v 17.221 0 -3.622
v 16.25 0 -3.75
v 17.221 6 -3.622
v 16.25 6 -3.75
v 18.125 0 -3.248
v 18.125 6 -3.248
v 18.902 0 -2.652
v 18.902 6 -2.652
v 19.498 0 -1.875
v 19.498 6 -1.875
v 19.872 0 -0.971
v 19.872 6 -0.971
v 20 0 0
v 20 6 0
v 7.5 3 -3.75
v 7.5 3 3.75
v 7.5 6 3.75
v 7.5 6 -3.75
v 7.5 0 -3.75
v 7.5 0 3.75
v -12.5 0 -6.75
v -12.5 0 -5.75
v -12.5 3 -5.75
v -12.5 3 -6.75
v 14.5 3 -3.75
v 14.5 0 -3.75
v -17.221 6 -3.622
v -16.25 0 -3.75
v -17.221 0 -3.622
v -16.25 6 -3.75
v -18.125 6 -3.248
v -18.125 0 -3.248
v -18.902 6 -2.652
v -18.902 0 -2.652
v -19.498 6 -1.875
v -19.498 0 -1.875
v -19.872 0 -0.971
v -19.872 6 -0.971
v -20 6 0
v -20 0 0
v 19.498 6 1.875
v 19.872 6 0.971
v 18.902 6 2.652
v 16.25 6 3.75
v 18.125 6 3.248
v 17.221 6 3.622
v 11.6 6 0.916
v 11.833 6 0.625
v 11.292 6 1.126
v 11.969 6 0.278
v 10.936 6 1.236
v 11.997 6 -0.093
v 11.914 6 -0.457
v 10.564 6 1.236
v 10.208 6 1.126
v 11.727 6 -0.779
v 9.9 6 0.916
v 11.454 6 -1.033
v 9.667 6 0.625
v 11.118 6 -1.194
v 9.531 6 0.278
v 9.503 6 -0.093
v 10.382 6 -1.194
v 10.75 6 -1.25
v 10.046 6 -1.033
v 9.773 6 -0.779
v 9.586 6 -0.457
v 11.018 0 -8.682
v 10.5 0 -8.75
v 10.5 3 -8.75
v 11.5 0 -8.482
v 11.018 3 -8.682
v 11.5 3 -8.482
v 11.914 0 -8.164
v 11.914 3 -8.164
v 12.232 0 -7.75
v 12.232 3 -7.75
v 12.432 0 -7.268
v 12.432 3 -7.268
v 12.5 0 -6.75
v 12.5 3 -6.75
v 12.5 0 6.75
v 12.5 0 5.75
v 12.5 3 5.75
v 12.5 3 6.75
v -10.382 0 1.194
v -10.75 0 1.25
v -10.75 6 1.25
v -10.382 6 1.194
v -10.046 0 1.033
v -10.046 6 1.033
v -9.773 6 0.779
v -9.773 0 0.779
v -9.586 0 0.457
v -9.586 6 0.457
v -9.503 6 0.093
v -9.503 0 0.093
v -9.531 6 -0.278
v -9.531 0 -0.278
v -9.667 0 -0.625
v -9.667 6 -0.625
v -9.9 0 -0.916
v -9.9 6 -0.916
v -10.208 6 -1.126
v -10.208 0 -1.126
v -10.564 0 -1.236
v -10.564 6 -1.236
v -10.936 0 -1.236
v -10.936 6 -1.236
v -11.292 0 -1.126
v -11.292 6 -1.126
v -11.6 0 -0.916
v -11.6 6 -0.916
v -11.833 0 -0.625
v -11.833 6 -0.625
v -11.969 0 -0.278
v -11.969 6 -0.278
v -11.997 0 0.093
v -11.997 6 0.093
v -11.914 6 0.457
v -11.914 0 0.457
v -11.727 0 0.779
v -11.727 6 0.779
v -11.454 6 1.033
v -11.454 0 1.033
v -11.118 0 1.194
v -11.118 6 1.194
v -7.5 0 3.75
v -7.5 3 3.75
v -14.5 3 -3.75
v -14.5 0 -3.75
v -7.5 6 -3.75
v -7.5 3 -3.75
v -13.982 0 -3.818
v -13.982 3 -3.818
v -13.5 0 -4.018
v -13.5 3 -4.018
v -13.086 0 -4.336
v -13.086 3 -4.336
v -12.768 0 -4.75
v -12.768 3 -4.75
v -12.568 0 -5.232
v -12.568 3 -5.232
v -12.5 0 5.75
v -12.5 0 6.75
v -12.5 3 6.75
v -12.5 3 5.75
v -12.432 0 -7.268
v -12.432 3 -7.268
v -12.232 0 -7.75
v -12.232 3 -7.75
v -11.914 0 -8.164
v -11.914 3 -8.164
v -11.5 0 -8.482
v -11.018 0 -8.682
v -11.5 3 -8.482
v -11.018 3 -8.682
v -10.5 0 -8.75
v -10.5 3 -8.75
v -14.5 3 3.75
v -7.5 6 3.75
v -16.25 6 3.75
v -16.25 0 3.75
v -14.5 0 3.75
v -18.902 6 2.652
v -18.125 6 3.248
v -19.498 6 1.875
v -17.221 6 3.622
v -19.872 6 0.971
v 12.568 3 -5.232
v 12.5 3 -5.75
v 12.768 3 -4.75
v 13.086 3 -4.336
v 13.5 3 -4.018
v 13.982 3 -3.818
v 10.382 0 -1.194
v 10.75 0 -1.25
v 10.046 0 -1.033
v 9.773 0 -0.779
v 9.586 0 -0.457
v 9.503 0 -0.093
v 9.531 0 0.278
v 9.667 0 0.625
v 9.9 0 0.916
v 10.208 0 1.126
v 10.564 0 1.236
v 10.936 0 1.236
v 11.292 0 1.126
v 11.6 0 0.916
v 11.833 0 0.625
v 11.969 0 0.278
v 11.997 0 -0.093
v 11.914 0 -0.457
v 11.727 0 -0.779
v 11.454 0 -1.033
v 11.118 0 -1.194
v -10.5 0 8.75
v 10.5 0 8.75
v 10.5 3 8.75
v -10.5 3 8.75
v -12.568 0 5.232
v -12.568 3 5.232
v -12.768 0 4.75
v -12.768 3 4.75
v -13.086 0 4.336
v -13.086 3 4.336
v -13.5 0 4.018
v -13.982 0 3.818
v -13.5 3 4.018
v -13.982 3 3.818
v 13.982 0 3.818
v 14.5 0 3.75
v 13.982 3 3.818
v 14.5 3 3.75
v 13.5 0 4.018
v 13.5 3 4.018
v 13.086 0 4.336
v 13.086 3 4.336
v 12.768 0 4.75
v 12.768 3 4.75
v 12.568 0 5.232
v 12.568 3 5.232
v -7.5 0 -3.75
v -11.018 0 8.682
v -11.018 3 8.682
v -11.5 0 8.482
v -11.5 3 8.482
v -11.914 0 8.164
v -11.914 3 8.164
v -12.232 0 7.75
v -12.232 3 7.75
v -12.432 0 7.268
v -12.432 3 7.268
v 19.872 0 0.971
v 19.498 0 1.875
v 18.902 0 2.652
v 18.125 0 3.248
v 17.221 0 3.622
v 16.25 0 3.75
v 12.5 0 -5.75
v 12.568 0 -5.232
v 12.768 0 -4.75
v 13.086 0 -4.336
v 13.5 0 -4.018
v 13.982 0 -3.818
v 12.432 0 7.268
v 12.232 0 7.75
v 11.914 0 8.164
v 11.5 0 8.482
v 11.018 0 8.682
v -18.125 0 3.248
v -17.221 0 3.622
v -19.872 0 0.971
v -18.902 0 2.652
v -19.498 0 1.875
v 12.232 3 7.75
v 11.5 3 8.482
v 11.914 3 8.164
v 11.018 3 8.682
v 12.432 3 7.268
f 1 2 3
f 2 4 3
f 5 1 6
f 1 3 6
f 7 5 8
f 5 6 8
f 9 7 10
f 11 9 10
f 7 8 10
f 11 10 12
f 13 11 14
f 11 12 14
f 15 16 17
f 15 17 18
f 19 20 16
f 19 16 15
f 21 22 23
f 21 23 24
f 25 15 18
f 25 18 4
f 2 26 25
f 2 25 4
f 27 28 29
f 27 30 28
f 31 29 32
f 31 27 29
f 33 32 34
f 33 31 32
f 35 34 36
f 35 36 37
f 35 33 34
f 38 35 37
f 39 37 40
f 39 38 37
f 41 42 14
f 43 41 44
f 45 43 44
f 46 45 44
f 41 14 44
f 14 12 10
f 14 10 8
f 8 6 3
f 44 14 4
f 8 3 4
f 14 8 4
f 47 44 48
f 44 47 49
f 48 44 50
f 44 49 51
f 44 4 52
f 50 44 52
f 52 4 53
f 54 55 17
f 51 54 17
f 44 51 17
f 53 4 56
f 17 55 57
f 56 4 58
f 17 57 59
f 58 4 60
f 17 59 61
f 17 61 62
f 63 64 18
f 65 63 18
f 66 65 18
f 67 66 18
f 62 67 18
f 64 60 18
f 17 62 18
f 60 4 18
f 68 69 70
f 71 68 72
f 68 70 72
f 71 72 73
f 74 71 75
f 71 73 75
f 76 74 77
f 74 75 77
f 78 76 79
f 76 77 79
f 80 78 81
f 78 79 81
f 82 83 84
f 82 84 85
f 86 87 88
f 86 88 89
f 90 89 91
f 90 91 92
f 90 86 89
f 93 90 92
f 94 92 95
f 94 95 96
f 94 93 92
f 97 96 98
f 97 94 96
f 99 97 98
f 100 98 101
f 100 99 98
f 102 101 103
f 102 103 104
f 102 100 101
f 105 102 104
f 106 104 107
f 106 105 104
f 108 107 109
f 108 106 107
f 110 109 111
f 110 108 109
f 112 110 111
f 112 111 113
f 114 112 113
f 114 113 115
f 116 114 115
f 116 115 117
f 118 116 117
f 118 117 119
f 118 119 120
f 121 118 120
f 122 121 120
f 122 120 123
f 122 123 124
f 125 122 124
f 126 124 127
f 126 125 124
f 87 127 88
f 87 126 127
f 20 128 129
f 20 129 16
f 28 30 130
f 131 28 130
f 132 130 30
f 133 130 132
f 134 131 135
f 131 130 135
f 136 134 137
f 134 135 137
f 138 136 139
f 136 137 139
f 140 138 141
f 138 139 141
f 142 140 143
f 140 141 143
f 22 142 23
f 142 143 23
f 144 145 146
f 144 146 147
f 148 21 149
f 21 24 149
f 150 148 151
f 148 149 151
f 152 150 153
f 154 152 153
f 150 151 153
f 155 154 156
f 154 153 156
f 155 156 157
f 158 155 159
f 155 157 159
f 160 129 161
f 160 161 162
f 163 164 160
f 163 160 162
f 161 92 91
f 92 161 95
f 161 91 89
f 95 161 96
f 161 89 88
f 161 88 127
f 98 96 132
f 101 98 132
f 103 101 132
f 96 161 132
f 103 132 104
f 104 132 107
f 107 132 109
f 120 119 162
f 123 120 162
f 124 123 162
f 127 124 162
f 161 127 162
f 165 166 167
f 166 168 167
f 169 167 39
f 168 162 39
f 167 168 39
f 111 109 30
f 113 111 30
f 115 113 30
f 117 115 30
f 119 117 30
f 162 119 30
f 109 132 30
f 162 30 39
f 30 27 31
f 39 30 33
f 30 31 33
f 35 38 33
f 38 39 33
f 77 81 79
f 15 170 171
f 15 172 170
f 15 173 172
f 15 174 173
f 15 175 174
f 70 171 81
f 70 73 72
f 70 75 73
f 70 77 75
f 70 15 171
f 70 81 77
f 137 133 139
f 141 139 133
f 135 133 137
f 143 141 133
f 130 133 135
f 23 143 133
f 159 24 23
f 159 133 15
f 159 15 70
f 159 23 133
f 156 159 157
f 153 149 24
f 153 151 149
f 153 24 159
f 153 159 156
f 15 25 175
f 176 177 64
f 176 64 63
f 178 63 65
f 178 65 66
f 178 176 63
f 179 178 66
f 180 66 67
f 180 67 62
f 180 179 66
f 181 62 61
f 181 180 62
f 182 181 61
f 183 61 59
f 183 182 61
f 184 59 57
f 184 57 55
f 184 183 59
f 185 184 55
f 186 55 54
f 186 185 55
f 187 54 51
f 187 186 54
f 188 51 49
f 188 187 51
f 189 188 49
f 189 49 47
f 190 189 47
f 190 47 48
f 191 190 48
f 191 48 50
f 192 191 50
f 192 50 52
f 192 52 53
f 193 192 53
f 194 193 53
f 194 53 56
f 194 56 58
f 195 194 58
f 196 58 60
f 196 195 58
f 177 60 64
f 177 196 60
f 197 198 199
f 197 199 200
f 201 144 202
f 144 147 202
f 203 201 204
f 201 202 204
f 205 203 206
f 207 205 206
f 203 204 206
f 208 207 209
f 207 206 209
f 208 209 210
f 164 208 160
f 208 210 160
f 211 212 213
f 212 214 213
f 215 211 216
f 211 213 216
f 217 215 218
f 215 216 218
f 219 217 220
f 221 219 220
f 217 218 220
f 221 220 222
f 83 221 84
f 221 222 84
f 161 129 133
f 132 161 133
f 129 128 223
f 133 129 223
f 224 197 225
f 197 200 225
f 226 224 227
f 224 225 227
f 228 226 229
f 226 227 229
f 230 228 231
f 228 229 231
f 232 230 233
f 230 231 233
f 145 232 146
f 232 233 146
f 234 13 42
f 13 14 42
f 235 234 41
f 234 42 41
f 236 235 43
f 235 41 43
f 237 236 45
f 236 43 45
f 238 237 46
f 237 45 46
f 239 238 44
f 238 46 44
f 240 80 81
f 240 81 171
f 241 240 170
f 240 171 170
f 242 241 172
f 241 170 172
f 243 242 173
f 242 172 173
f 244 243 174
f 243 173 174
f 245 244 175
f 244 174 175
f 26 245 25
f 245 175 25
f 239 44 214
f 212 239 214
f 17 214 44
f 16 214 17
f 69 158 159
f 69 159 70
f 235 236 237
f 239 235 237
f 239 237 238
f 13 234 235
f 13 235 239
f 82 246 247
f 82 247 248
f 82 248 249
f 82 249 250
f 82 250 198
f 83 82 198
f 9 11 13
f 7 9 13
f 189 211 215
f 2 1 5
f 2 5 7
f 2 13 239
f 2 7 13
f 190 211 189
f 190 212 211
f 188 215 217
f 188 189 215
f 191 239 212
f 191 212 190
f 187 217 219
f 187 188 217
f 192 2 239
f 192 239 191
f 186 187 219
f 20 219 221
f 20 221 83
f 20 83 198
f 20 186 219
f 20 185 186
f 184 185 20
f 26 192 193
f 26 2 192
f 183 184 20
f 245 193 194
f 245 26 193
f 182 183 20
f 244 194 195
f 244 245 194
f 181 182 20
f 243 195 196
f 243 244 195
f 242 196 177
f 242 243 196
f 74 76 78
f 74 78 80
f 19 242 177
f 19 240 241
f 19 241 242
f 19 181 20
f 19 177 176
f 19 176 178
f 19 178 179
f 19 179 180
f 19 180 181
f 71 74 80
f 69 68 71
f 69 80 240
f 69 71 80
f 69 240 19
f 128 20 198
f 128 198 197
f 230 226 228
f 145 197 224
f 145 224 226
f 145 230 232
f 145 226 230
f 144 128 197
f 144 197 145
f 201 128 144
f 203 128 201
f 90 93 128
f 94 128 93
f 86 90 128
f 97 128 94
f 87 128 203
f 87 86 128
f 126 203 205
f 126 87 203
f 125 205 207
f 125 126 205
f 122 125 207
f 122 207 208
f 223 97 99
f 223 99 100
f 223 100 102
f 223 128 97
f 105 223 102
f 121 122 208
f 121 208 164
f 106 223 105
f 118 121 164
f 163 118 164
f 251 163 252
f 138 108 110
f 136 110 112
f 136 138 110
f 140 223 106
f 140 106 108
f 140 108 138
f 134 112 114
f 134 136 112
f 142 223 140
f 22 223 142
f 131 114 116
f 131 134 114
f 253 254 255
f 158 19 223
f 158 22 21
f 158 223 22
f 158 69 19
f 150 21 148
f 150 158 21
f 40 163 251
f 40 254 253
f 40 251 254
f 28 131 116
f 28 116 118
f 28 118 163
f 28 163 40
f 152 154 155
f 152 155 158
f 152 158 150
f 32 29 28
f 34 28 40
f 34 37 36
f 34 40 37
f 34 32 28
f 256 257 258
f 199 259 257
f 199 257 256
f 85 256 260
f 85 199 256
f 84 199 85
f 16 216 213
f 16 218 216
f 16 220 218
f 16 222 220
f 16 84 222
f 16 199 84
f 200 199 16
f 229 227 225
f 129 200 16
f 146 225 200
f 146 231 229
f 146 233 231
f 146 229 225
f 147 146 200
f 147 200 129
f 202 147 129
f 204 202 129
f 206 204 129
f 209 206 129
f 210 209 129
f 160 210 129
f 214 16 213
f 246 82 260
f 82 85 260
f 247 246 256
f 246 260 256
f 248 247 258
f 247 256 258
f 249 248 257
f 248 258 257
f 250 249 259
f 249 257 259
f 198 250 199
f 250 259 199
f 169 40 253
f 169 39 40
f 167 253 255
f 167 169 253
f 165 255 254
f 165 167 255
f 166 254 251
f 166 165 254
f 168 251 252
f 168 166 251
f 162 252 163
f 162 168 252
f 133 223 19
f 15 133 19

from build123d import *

# Parameters (mm, degrees)
SKETCH1_W               = 15
SKETCH1_H               = 7.5
BOSS_EXTRUDE1_DEPTH     = 6
SKETCH2_R               = 1.25
CUT_EXTRUDE1_DEPTH      = 6
FILLET1_R               = 3.75
CUT_EXTRUDE2_DEPTH      = 23.639843197
CUT_EXTRUDE2_DEPTH_BACK = 23.639843197
SKETCH3_W               = 5
SKETCH3_H               = 3
FILLET2_R               = 2


with BuildPart() as part:
    # Sketch1 → Boss-Extrude1 (new body)
    with BuildSketch(Plane(origin=(0, 0, 0), x_dir=(1, 0, 0), z_dir=(0, 1, 0))):
        Polygon((-20, 3.75), (-12.5, 3.75), (-12.5, 8.75), (12.5, 8.75), (12.5, 3.75), (20, 3.75), (20, -3.75), (12.5, -3.75), (12.5, -8.75), (-12.5, -8.75), (-12.5, -3.75), (-20, -3.75), align=None)
        Rectangle(SKETCH1_W, SKETCH1_H, mode=Mode.SUBTRACT)
    extrude(amount=BOSS_EXTRUDE1_DEPTH)

    # Sketch2 → Cut-Extrude1 (cut)
    with BuildSketch(Plane(origin=(0, 0, 0), x_dir=(1, 0, 0), z_dir=(0, 1, 0))):
        with Locations(Location((-10.75, 0, 0), (0, 0, 270))):
            Circle(SKETCH2_R)
        with Locations(Location((10.75, 0, 0), (0, 0, 90))):
            Circle(SKETCH2_R)
    extrude(amount=CUT_EXTRUDE1_DEPTH, mode=Mode.SUBTRACT)

    # Fillet1
    fillet1_edges = [part.edges().sort_by_distance(p)[0] for p in [
        (-20, 3, 3.75),
        (-20, 3, -3.75),
        (20, 3, 3.75),
        (20, 3, -3.75),
    ]]
    fillet(fillet1_edges, radius=FILLET1_R - 0.0001)  # a hair under: the kernel refuses the full size

    # Sketch3 → Cut-Extrude2 (cut, two sides: drawn at the far end of the back side and taken through both)
    with BuildSketch(Plane(origin=(0, 0, 0), x_dir=(0, 0, -1), z_dir=(1, 0, 0)).offset(-CUT_EXTRUDE2_DEPTH_BACK)):
        with Locations((6.25, 4.5)):
            Rectangle(SKETCH3_W, SKETCH3_H)
        with Locations((-6.25, 4.5)):
            Rectangle(SKETCH3_W, SKETCH3_H)
    extrude(amount=CUT_EXTRUDE2_DEPTH + CUT_EXTRUDE2_DEPTH_BACK, mode=Mode.SUBTRACT)

    # Fillet2
    fillet2_edges = [part.edges().sort_by_distance(p)[0] for p in [
        (12.5, 1.5, 3.75),
        (12.5, 1.5, 8.75),
        (-12.5, 1.5, 8.75),
        (-12.5, 1.5, 3.75),
        (-12.5, 1.5, -3.75),
        (-12.5, 1.5, -8.75),
        (12.5, 1.5, -8.75),
        (12.5, 1.5, -3.75),
    ]]
    fillet(fillet2_edges, radius=FILLET2_R)


solid = part.part
